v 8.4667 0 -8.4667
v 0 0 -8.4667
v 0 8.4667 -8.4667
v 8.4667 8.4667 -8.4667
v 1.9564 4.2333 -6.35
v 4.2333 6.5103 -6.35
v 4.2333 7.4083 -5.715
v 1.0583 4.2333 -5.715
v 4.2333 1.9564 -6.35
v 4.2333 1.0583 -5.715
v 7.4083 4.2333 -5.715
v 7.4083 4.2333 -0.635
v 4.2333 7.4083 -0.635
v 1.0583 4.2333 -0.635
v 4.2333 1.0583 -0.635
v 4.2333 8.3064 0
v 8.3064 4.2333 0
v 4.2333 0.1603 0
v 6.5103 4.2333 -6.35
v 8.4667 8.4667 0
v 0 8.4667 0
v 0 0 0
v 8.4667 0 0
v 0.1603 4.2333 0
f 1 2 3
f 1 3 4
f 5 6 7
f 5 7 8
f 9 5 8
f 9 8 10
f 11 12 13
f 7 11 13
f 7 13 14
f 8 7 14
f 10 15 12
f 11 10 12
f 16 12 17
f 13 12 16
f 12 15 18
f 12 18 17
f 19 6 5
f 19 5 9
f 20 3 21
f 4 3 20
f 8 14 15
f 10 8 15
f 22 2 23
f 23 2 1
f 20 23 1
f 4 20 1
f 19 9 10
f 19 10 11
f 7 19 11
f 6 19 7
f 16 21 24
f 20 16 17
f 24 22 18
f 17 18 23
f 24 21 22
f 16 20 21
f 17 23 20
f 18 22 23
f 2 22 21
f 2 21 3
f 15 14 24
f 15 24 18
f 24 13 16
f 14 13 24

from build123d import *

# Parameters (mm, degrees)
SKETCH1_W           = 8.466666667
SKETCH1_H           = 8.466666667
BOSS_EXTRUDE1_DEPTH = 8.466666667
CUT_EXTRUDE1_DEPTH  = 6.35
CHAMFER1_SIZE       = 0.635


with BuildPart() as part:
    # Sketch1 → Boss-Extrude1 (new body)
    with BuildSketch(Plane(origin=(0, 0, 0), x_dir=(1, 0, 0), z_dir=(0, 1, 0))):
        with Locations((4.233333334, 4.233333334)):
            Rectangle(SKETCH1_W, SKETCH1_H)
    extrude(amount=BOSS_EXTRUDE1_DEPTH)

    # Sketch3 → Cut-Extrude1 (cut)
    with BuildSketch(Plane.XY):
        Polygon((1.058333333, 4.233333333), (4.233333333, 1.058333333), (7.408333333, 4.233333333), (4.233333333, 7.408333333), align=None)
    extrude(amount=-CUT_EXTRUDE1_DEPTH, mode=Mode.SUBTRACT)

    # Chamfer1
    chamfer1_edges = [part.edges().sort_by_distance(p)[0] for p in [
        (2.645833333, 5.820833333, -6.35),
        (5.820833333, 5.820833333, -6.35),
        (5.820833333, 2.645833333, -6.35),
        (2.645833333, 2.645833333, -6.35),
        (2.645833333, 5.820833333, 0),
        (2.645833333, 2.645833333, 0),
        (5.820833333, 2.645833333, 0),
        (5.820833333, 5.820833333, 0),
    ]]
    chamfer(chamfer1_edges, length=CHAMFER1_SIZE)


solid = part.part
